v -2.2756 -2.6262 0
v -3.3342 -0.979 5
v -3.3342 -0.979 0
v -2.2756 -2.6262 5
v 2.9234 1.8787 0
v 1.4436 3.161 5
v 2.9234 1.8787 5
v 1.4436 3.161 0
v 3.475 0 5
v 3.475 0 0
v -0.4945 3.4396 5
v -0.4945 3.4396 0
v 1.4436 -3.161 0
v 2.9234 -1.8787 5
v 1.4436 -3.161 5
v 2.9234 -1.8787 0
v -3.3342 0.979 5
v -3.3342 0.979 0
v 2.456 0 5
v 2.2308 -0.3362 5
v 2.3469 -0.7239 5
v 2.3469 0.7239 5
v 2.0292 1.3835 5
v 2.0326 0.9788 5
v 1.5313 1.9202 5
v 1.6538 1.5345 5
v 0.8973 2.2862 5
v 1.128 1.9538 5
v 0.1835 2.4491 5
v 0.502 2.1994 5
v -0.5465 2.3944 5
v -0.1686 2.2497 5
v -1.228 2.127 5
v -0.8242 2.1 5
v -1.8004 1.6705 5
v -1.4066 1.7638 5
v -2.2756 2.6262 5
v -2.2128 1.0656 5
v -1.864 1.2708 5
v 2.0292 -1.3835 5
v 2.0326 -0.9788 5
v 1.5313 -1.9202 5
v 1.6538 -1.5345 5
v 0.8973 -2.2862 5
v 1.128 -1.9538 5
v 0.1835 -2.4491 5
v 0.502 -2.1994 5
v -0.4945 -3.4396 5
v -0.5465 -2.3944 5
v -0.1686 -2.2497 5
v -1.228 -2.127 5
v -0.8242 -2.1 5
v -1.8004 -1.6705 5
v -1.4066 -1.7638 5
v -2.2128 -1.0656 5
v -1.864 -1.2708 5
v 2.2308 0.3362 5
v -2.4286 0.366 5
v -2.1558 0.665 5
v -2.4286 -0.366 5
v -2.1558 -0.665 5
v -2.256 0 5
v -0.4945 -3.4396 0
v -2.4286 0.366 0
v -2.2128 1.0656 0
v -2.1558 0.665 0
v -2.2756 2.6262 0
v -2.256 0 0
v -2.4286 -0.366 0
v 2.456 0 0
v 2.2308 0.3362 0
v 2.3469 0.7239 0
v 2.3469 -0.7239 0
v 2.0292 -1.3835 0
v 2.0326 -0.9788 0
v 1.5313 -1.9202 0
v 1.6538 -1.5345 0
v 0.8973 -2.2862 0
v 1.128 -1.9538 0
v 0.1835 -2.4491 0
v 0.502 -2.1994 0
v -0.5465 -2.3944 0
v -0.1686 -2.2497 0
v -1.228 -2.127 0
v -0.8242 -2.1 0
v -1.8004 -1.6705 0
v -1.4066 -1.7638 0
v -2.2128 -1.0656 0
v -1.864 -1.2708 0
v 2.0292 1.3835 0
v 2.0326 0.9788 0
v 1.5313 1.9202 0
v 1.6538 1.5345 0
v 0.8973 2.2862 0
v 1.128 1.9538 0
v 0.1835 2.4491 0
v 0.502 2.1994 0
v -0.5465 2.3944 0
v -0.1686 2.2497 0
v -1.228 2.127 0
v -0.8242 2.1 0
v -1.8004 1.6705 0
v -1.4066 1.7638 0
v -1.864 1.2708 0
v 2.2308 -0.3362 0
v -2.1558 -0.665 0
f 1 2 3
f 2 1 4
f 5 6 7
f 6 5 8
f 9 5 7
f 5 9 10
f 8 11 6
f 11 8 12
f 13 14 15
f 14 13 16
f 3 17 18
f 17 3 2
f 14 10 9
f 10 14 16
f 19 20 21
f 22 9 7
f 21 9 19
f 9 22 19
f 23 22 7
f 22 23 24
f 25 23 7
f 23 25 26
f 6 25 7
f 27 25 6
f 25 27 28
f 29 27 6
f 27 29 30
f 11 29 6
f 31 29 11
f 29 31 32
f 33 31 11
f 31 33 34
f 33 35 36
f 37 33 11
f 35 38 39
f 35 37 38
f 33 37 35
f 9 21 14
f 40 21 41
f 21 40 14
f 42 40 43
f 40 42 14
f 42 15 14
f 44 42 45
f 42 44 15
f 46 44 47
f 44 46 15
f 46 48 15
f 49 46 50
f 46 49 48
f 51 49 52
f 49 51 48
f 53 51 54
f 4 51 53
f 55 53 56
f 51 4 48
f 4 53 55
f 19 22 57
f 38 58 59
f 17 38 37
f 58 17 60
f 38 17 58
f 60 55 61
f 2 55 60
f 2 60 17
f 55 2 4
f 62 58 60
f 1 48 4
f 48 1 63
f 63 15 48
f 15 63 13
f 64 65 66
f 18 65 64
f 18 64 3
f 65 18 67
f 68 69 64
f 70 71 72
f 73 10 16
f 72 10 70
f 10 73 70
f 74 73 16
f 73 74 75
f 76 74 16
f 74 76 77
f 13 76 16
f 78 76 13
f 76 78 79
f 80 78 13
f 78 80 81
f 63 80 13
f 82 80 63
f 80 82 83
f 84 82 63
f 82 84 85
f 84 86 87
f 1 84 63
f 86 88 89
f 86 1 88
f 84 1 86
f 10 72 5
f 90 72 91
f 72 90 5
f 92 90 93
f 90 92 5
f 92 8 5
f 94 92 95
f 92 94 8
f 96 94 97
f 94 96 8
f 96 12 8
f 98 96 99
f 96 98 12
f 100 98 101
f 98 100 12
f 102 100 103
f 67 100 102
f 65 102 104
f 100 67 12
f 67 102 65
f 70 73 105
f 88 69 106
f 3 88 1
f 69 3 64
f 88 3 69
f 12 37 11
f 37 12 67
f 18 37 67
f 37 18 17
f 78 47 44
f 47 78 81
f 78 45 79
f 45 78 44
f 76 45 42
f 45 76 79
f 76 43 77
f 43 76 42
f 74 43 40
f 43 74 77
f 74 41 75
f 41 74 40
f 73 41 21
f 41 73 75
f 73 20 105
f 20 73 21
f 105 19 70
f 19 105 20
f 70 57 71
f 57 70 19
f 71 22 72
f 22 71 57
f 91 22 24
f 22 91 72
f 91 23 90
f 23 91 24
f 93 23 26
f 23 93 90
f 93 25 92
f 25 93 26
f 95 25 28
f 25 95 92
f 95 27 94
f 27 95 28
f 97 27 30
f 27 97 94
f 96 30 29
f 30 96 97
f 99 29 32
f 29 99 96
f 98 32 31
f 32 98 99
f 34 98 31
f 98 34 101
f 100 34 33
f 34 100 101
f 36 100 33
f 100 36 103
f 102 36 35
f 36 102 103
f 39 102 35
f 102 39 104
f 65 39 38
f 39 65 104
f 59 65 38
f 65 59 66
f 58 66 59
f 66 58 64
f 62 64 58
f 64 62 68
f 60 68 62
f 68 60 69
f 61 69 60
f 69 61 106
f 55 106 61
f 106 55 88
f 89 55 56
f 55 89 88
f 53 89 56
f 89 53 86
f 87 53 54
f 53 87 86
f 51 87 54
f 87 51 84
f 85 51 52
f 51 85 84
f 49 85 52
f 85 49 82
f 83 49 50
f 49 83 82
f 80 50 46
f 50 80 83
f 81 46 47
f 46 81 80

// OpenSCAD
// The goal of this module is to create a hollow cylinder with a number of triangular teeth on the inside.
function get_circle_coordinates(angle, radius) = [radius * cos(angle), radius * sin(angle)];

module triangular_teeth(outer_diameter, inner_diameter, tooth_length, number_of_teeth, height){
    linear_extrude(height=height){
        polygon(points = [for (index = [0 : 2*number_of_teeth]) get_circle_coordinates(
            // This splits each point into its angle from 0.
            angle = (360*index)/(2*number_of_teeth),
            // This sets the radius of the point on the circle, with even points being outside vertices
            // and odd points being the sharp, pointy part of the tooth.
            radius = index % 2 == 0 ? inner_diameter/2 : inner_diameter/2 - tooth_length)]);
    }
}

module triangular_tooth_cylinder(outer_diameter, inner_diameter, tooth_length, number_of_teeth, height){
    assert(number_of_teeth > 2, "This module doesn't make any sense with fewer than 3 teeth");
    assert(outer_diameter > inner_diameter, "This module doesn't make any sense with a larger inner diameter than the outer diameter");
    assert(tooth_length < inner_diameter/2, "The teeth can't be longer than the inner radius, or it'll just be a filled-in cylinder");

    difference(){
        cylinder(h = height, r = outer_diameter/2);
        triangular_teeth(outer_diameter = outer_diameter, inner_diameter = inner_diameter, tooth_length = tooth_length, number_of_teeth = number_of_teeth, height = height);
    }
}


triangular_tooth_cylinder(outer_diameter = 6.95, inner_diameter = 4.912, tooth_length = .2, number_of_teeth = 21, height = 5);
